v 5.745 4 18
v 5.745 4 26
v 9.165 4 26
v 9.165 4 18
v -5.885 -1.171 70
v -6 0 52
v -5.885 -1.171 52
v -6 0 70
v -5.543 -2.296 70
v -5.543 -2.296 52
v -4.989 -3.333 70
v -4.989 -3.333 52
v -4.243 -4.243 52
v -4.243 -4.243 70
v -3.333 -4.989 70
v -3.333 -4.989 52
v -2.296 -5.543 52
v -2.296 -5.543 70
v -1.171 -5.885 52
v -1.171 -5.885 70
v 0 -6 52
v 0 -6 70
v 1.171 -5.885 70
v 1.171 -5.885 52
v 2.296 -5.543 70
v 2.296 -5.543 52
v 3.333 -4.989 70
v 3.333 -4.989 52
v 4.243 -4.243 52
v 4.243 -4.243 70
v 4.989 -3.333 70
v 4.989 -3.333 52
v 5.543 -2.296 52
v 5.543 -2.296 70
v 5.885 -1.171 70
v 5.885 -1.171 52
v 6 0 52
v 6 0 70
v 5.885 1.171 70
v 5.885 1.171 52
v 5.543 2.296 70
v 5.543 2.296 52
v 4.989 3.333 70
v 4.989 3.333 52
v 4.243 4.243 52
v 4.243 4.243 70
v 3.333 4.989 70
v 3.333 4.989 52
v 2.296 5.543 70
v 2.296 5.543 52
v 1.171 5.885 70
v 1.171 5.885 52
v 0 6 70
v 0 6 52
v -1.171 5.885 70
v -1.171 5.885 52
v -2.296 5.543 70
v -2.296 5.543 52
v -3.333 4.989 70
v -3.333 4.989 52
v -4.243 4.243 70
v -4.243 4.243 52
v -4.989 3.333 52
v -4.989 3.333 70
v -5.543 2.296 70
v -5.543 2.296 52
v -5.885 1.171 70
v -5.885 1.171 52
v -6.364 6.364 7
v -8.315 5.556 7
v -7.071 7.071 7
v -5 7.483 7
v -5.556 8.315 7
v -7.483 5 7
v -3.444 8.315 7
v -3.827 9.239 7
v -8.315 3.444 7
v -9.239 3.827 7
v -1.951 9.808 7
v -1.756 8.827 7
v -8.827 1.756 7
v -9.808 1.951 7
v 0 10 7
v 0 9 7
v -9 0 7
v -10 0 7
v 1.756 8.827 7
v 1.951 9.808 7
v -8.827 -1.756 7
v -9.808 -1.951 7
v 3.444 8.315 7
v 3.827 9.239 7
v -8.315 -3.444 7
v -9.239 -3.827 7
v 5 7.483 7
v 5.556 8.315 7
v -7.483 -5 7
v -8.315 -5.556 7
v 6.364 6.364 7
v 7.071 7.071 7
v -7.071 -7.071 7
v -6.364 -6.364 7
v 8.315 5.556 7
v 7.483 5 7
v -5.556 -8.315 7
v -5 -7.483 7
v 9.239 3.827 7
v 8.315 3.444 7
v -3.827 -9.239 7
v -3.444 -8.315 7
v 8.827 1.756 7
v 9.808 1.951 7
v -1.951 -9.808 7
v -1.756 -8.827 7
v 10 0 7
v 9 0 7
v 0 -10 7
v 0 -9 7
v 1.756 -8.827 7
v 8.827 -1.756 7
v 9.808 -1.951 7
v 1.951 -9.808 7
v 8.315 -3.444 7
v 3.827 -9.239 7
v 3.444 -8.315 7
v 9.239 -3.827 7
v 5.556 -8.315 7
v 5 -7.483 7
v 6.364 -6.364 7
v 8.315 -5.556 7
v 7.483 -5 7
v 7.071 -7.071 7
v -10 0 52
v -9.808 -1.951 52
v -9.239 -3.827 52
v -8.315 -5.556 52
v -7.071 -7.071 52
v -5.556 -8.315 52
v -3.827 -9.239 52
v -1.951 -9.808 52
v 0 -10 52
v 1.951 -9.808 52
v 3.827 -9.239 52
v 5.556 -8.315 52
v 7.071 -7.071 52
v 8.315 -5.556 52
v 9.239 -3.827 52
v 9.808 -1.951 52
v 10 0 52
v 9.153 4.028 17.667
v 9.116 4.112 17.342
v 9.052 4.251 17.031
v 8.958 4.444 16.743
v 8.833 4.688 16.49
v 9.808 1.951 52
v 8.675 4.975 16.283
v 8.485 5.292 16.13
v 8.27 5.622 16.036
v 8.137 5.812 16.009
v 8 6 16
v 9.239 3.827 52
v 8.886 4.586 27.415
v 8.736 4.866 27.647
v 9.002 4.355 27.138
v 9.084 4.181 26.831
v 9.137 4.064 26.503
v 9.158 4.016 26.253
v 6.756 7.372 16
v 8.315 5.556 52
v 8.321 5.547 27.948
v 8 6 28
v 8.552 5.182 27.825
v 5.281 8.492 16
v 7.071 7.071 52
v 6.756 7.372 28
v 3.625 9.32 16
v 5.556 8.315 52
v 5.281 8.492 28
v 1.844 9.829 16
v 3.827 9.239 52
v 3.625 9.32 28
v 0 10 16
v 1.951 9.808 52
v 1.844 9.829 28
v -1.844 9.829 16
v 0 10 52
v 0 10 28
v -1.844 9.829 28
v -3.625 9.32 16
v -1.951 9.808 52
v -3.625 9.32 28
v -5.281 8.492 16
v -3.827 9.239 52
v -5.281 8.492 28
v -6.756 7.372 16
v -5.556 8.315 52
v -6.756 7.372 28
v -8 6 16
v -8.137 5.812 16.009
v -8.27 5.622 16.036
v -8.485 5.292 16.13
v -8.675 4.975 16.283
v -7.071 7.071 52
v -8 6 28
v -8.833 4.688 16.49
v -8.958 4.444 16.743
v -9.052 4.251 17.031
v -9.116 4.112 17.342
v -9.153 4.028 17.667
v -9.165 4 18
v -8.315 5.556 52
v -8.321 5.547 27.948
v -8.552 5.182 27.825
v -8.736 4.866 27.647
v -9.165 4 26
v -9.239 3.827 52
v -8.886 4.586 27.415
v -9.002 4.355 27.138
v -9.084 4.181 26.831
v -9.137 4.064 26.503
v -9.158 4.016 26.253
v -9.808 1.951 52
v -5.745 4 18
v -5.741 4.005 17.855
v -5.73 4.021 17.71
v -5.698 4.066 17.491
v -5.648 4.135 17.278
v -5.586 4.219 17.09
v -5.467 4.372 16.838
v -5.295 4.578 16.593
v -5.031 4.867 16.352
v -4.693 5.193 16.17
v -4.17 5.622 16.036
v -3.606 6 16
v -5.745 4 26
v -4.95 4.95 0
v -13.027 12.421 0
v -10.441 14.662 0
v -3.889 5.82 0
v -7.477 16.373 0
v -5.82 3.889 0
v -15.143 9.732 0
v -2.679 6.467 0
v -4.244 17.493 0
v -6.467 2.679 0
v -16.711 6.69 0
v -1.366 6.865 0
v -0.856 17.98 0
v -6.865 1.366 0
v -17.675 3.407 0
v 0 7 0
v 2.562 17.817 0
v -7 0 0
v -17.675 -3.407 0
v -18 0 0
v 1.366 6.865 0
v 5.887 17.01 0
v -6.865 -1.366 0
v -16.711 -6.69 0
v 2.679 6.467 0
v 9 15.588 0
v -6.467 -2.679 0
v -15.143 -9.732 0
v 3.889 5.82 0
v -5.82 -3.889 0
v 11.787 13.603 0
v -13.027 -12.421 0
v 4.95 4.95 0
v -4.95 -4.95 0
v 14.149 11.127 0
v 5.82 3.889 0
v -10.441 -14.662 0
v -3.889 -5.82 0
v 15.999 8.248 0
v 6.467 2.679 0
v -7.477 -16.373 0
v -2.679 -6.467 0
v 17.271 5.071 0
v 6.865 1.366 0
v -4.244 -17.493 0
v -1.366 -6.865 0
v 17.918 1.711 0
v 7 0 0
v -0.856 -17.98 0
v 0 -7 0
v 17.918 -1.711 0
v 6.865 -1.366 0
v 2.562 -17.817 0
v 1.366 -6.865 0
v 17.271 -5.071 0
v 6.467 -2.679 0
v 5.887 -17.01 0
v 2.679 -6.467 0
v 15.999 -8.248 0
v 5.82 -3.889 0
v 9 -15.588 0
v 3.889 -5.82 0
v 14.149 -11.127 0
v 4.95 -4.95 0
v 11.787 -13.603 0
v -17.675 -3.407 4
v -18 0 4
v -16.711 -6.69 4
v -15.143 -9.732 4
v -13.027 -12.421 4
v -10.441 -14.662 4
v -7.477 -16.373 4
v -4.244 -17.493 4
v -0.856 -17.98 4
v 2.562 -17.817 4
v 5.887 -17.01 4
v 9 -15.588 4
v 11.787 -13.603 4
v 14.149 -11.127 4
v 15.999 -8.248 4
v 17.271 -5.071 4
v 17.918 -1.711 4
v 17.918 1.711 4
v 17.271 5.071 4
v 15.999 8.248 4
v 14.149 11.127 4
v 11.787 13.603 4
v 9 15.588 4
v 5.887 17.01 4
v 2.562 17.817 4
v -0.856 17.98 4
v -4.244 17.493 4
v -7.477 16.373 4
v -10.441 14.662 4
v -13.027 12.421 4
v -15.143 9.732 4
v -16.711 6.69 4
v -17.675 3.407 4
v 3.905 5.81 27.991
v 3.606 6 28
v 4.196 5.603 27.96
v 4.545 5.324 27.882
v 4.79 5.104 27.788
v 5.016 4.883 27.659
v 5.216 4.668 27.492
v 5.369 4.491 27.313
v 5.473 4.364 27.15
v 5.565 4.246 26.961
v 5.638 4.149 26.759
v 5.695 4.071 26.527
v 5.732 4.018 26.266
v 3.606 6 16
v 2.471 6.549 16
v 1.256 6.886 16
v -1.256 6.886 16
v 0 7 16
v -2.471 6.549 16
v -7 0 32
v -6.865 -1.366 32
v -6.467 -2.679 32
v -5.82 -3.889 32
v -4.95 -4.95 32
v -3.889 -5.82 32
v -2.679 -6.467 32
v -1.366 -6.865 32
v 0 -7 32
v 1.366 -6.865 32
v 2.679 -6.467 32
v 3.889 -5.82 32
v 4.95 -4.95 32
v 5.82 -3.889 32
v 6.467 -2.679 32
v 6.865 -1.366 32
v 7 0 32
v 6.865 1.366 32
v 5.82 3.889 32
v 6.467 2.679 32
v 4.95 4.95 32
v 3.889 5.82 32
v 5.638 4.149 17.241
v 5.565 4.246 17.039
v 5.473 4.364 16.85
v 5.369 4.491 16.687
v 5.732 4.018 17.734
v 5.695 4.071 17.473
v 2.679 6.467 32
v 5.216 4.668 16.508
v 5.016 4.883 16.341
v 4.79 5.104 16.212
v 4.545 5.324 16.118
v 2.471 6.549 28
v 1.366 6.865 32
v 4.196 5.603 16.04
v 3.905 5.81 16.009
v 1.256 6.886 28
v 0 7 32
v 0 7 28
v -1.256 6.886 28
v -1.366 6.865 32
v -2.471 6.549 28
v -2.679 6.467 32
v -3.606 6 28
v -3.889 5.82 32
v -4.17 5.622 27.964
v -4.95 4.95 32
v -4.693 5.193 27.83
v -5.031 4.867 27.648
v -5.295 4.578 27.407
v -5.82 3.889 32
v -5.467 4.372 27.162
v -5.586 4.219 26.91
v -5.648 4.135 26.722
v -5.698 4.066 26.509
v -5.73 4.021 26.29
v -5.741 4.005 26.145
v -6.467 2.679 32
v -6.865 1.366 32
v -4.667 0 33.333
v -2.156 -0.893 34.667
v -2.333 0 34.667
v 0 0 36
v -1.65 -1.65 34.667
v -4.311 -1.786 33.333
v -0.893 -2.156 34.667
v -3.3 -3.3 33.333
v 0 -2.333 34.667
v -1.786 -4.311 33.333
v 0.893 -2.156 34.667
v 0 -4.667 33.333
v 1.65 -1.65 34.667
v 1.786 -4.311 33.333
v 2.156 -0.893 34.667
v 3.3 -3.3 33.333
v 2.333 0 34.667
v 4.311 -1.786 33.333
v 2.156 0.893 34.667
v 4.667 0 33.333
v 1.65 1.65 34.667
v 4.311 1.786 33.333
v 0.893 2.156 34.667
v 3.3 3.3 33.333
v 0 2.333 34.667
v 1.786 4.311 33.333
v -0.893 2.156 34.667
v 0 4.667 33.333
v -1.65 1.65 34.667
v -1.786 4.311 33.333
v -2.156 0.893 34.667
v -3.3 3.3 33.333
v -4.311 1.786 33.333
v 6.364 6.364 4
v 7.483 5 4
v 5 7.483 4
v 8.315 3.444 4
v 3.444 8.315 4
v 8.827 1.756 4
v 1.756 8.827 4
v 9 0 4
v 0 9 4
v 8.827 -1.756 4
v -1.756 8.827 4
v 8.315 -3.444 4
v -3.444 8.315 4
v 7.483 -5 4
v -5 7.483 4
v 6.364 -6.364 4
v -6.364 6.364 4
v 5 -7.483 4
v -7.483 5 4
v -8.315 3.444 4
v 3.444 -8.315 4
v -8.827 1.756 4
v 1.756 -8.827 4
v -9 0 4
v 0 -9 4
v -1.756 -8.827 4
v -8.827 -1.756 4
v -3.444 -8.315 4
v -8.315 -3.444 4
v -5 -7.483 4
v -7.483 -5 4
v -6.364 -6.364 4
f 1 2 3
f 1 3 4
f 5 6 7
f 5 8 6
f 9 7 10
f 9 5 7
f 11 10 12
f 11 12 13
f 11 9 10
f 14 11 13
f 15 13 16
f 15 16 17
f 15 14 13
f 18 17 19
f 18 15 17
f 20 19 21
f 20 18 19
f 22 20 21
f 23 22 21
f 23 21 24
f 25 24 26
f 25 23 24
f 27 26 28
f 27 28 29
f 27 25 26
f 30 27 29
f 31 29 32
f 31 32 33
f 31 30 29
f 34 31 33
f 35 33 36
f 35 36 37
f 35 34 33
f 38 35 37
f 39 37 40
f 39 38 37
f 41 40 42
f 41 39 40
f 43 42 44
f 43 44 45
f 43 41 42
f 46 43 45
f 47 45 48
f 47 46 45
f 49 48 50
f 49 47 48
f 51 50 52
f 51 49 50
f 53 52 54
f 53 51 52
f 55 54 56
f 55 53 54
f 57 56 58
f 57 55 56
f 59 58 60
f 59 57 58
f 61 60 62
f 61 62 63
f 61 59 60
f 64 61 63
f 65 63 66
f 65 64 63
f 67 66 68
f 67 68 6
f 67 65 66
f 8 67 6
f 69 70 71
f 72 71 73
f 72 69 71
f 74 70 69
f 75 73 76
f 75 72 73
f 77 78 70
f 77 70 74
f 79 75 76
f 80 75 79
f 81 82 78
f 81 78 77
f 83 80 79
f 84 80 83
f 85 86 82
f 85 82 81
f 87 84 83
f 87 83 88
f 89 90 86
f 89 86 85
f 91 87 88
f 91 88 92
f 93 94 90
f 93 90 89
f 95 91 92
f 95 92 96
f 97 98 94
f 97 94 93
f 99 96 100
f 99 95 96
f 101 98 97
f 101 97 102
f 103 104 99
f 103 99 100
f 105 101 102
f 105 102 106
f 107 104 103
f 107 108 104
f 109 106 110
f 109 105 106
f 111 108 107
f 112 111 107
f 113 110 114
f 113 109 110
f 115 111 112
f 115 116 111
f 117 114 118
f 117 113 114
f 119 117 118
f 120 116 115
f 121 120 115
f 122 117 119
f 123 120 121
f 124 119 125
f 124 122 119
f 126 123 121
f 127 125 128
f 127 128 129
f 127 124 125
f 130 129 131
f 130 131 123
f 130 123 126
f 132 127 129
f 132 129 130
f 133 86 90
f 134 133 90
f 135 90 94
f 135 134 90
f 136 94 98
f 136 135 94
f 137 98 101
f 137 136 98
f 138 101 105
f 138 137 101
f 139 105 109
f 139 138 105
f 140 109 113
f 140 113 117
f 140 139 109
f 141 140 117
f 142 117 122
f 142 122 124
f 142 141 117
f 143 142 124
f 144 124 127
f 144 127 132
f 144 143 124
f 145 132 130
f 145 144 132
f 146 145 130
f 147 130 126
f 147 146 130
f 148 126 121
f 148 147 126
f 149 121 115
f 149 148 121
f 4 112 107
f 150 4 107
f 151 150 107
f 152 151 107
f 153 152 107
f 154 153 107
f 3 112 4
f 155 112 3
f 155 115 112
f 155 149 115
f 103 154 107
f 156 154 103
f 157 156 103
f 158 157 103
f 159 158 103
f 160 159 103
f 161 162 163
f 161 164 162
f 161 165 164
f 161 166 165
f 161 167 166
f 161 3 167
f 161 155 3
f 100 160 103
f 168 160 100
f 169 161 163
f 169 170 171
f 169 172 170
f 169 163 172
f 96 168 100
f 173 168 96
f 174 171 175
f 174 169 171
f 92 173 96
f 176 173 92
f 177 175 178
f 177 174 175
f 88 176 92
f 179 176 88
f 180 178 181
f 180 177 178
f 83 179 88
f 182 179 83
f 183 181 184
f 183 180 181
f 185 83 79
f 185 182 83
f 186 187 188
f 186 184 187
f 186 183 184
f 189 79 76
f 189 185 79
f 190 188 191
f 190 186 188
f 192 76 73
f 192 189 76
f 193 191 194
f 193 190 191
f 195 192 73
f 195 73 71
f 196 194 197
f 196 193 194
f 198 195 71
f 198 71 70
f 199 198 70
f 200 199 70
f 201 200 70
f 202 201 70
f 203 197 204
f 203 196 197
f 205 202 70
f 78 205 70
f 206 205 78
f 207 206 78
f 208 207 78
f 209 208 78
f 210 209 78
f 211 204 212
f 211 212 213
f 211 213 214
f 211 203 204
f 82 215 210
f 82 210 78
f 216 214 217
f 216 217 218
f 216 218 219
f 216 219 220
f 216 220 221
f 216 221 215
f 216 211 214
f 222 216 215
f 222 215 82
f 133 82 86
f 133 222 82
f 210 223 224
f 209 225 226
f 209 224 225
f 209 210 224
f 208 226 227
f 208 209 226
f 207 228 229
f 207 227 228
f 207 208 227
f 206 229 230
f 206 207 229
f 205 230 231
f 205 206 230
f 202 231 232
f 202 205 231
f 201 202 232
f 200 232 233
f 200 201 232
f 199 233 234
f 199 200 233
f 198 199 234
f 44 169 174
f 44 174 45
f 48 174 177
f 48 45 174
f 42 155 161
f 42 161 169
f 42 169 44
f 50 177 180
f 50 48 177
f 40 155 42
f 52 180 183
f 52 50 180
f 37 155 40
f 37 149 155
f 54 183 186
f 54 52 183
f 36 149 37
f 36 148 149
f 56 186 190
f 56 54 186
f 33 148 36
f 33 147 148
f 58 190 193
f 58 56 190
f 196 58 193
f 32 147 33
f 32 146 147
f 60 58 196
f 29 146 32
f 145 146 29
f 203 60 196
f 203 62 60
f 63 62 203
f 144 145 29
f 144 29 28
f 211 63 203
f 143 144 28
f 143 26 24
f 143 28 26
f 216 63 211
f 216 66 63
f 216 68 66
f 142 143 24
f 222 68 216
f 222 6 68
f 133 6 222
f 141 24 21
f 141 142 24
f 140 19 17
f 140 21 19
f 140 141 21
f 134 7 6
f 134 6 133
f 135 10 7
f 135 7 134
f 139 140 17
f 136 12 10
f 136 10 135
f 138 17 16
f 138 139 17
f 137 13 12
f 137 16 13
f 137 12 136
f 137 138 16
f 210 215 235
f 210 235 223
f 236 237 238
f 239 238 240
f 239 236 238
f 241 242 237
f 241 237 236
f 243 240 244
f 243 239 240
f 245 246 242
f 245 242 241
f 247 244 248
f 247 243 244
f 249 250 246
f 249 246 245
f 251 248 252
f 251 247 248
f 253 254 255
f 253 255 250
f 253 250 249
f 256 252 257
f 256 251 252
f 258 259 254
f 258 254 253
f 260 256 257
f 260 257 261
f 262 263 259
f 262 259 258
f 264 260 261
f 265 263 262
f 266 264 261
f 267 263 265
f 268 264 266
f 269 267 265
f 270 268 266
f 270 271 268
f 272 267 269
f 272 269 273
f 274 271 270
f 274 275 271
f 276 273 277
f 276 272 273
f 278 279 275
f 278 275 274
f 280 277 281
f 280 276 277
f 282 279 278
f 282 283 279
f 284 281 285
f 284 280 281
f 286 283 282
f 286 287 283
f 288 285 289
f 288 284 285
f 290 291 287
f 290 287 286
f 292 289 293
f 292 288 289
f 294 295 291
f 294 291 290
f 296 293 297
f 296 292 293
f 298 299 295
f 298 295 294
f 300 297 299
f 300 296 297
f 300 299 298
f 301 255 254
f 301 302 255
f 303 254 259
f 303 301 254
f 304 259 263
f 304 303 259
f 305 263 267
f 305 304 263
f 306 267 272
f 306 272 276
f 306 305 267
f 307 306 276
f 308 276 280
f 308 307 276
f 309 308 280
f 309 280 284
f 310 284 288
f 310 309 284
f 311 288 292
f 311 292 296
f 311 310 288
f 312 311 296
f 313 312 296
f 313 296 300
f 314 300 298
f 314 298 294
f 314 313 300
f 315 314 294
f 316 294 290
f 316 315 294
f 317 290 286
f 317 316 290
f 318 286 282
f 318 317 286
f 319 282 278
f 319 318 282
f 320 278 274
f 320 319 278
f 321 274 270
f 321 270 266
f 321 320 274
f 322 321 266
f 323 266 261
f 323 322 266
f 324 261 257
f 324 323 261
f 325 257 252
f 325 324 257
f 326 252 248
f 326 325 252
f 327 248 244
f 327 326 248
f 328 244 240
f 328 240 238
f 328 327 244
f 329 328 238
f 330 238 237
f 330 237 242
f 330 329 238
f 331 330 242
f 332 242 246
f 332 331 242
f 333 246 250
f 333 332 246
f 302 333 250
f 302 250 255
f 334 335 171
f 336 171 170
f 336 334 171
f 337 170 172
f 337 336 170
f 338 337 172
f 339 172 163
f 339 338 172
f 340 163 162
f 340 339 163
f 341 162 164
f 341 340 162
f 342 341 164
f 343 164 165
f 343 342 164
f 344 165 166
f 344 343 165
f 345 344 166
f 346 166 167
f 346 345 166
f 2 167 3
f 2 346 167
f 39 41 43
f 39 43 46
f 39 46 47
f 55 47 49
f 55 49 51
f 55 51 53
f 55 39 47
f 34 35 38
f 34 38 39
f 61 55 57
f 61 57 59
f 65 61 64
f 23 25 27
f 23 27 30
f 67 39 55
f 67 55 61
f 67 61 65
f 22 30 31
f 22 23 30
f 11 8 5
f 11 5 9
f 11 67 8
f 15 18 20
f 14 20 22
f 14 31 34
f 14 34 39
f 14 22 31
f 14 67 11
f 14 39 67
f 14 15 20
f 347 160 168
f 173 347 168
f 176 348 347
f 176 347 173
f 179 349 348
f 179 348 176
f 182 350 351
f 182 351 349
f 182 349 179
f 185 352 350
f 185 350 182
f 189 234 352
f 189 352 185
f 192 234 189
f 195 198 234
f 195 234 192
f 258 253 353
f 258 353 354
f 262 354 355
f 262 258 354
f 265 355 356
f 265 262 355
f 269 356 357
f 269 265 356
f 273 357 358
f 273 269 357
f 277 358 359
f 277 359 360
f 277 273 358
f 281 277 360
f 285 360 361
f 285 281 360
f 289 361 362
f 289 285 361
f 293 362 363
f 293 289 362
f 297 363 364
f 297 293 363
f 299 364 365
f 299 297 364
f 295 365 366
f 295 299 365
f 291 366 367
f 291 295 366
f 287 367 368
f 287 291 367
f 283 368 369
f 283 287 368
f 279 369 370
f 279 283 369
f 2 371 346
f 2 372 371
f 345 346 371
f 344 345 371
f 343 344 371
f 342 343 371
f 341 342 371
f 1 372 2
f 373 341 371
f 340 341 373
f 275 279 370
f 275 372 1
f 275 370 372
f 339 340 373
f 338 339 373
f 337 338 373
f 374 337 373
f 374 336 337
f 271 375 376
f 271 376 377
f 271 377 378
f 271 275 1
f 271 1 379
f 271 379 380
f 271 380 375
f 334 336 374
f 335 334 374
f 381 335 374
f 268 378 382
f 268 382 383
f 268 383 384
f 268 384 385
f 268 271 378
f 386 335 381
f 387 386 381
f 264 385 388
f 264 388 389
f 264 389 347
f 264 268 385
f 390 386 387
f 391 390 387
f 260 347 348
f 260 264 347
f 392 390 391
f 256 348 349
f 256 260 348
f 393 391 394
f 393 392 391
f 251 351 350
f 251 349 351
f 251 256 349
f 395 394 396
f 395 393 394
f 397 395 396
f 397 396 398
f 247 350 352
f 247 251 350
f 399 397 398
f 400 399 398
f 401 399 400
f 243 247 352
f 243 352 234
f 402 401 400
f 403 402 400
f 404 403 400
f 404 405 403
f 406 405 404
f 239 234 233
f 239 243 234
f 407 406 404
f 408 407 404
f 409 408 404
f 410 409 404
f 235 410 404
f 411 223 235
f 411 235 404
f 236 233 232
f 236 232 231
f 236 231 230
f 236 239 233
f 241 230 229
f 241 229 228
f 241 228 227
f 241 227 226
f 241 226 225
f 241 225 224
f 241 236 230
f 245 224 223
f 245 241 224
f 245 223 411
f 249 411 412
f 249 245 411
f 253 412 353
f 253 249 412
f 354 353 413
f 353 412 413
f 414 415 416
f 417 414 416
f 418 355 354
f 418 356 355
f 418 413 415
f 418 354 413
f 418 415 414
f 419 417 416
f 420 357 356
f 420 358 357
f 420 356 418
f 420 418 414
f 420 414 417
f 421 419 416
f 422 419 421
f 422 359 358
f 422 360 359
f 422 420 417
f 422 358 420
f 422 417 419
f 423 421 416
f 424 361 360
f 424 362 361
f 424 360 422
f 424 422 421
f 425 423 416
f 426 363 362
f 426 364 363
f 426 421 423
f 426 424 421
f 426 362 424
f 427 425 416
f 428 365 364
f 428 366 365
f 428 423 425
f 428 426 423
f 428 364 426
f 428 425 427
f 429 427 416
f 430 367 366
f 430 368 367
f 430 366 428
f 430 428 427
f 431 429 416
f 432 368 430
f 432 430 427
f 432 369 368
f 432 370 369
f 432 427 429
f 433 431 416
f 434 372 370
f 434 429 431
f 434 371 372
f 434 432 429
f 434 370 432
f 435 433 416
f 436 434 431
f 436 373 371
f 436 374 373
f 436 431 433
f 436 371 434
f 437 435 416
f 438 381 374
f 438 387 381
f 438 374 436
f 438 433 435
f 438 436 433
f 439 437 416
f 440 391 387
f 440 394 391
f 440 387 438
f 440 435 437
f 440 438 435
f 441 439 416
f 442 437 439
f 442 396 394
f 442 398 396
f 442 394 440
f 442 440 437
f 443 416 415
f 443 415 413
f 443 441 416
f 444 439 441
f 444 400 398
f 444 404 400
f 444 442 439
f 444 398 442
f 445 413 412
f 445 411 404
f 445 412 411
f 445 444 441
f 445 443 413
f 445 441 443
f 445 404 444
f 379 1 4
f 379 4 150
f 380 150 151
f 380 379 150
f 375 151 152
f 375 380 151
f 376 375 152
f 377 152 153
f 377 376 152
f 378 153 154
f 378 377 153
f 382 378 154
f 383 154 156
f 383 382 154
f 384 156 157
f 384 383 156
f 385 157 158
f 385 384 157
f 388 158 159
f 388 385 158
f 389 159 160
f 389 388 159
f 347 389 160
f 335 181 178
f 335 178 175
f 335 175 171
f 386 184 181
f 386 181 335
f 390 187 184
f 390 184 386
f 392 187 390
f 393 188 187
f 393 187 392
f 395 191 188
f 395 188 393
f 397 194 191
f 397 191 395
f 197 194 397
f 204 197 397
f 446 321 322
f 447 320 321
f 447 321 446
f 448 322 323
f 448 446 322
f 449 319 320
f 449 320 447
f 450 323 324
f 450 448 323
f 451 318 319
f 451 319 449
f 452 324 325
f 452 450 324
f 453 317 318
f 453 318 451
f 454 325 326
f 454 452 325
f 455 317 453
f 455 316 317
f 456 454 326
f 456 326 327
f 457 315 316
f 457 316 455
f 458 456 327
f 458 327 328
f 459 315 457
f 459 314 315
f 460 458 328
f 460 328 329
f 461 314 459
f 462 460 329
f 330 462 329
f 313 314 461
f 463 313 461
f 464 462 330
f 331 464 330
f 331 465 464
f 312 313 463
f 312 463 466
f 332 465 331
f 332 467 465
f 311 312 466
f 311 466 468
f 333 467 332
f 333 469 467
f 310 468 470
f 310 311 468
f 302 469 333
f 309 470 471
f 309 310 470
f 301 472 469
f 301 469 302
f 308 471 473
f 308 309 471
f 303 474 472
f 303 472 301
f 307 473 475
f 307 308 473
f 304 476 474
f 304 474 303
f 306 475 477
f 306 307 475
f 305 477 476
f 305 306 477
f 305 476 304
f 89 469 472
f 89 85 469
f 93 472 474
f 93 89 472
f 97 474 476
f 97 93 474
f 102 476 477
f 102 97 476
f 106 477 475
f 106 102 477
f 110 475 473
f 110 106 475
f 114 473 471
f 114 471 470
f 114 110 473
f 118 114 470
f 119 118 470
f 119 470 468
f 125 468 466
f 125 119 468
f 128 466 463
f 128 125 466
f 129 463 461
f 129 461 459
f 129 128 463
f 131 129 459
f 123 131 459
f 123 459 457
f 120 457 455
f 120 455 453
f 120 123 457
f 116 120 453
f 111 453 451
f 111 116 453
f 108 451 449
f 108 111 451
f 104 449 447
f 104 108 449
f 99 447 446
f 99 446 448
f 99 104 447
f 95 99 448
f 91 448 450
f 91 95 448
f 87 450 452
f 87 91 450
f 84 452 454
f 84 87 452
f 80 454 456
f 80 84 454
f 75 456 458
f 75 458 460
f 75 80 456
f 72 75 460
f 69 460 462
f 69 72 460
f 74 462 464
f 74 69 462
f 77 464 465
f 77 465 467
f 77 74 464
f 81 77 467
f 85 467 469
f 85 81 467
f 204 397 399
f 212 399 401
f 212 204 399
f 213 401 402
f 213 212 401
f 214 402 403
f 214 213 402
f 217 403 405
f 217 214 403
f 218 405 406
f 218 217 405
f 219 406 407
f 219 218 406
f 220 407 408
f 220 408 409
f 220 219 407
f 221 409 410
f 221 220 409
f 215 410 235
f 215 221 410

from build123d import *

# Parameters (mm, degrees)
ENL_V_MAT_EXTRU_1_DEPTH      = 10
ENL_V_MAT_EXTRU_1_DEPTH_BACK = 10


with BuildPart() as part:
    # Esquisse1 → Révolution1 (revolve)
    with BuildSketch(Plane(origin=(0, 0, 0), x_dir=(0, 0, -1), z_dir=(1, 0, 0))):
        Polygon((-70, 0), (-36, 0), (-32, 7), (0, 7), (0, 18), (-4, 18), (-4, 9), (-7, 9), (-7, 10), (-52, 10), (-52, 6), (-70, 6), align=None)
    revolve(axis=Axis((0, 0, 0), (0, 0, 1)))

    # Esquisse2 → Enlèv. mat.-Extru.1 (cut, two sides: drawn at the far end of the back side and taken through both)
    with BuildSketch(Plane(origin=(0, 0, 0), x_dir=(0, 0, -1), z_dir=(1, 0, 0)).offset(-ENL_V_MAT_EXTRU_1_DEPTH_BACK)):
        with BuildLine():
            Line((-16, 10), (-28, 10))
            Line((-28, 10), (-28, 6))
            ThreePointArc((-28, 6), (-27.414213562, 4.585786438), (-26, 4))
            Line((-26, 4), (-18, 4))
            ThreePointArc((-18, 4), (-16.585786438, 4.585786438), (-16, 6))
            Line((-16, 6), (-16, 10))
        make_face()
    extrude(amount=ENL_V_MAT_EXTRU_1_DEPTH + ENL_V_MAT_EXTRU_1_DEPTH_BACK, mode=Mode.SUBTRACT)


solid = part.part
